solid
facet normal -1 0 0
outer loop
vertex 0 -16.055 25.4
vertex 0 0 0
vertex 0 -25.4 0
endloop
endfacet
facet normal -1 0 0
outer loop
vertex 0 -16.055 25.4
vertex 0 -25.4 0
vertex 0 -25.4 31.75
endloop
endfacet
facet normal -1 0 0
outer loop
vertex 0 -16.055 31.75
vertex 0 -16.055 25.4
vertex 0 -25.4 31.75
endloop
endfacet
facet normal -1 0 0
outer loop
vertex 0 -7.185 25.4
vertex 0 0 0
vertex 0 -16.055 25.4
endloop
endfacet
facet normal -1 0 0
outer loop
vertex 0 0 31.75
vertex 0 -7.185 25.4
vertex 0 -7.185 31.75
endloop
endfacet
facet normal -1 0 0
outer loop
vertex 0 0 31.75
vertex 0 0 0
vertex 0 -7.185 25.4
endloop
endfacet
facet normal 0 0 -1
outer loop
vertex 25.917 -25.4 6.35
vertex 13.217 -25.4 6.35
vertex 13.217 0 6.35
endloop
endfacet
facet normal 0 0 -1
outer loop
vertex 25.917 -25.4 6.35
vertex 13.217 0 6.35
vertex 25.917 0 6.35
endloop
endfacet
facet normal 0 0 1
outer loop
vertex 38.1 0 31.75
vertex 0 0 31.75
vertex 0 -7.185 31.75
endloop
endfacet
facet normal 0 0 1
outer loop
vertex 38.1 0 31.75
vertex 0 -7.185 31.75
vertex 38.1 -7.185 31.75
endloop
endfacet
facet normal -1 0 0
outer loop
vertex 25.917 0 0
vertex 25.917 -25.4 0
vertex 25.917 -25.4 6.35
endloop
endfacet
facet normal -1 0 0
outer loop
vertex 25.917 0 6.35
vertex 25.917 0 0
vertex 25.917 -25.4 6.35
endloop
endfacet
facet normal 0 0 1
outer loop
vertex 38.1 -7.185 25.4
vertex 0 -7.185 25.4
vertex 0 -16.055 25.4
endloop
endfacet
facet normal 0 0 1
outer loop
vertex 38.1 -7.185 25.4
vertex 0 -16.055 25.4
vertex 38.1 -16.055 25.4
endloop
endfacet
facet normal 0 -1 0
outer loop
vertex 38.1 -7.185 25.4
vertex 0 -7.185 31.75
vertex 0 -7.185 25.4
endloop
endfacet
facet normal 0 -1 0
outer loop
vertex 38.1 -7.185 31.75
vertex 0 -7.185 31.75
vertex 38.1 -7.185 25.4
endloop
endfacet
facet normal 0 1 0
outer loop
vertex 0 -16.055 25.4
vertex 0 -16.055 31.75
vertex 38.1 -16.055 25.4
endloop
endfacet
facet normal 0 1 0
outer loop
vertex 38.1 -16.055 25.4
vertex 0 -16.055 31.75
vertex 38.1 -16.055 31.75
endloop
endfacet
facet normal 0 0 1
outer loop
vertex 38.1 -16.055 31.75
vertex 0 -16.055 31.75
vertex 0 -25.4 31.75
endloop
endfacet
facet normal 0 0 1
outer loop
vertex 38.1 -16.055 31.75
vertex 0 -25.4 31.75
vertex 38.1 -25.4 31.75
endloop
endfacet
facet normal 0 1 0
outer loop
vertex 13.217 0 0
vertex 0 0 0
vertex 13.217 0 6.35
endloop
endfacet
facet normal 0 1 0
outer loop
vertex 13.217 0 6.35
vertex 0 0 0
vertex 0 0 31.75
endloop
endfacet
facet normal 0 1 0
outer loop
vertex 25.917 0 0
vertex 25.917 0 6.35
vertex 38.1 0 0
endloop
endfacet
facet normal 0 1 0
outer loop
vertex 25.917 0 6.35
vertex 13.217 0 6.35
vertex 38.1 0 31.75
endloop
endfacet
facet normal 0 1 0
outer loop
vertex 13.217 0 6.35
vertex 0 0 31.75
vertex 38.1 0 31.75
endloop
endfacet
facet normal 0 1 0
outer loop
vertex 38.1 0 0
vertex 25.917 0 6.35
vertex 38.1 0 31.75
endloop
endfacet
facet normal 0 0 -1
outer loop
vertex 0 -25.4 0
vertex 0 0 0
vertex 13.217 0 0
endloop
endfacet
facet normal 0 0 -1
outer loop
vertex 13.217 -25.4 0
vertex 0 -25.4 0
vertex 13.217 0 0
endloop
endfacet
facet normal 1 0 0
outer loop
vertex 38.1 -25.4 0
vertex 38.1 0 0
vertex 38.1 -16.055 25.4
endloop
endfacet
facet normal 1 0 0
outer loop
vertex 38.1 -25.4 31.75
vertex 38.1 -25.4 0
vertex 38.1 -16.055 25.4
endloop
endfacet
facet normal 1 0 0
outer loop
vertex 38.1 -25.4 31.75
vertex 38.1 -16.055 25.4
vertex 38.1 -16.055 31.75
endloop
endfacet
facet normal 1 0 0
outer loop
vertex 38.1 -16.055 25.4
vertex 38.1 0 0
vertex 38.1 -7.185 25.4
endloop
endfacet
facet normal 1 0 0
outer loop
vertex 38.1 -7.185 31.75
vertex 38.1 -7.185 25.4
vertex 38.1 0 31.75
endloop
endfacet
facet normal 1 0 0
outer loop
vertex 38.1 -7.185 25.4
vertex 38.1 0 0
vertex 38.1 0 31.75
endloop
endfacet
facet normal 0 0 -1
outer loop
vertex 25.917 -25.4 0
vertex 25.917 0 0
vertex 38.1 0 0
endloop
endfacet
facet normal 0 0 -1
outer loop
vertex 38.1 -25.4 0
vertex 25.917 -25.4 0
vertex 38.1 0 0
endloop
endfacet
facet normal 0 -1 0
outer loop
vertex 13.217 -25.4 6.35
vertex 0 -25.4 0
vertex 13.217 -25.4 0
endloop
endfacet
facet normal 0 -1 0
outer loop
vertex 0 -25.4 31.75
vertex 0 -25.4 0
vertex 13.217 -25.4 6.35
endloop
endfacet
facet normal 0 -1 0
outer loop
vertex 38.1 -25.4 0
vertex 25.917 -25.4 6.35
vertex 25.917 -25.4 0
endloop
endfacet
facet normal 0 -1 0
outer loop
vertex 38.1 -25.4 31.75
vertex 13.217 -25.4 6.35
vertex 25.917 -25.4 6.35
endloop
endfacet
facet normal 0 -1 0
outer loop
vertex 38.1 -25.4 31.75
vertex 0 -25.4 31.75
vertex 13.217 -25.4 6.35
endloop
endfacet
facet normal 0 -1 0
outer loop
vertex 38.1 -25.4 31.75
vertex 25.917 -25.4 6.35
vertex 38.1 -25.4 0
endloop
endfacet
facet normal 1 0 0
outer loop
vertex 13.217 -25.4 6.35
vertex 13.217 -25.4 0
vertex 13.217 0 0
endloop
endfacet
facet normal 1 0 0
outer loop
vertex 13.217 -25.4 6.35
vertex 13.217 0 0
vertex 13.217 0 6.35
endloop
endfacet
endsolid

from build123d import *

# Parameters (mm, degrees)
F0_W     = 38.1
F0_H     = 31.75
F1_DEPTH = 25.4
F2_W     = 12.7
F2_H     = 6.35
F3_DEPTH = 25.401
F4_W     = 38.1
F4_H     = 8.8702891953
F5_DEPTH = 6.35


# Not quite as in the source:
# - a length typed as a fraction of an inch, garbled in the dataset ("3 / 203.2 mm" for 3/8 in), is restored


with BuildPart() as f1:
    # F0 (on Front) → F1 (new body)
    with BuildSketch(Plane.XZ):
        with Locations((19.05, 15.875)):
            Rectangle(F0_W, F0_H)
    extrude(amount=F1_DEPTH)

    # F2 (on face) → F3 (cut, through all)
    with BuildSketch(Plane.XZ.offset(25.4)):
        with Locations((19.5667292759, 3.175)):
            Rectangle(F2_W, F2_H)
    extrude(amount=-F3_DEPTH, mode=Mode.SUBTRACT)

    # F4 (on face) → F5 (cut)
    with BuildSketch(Plane.XY.offset(31.75)):
        with Locations((19.05, -11.620078003)):
            Rectangle(F4_W, F4_H)
    extrude(amount=-F5_DEPTH, mode=Mode.SUBTRACT)


solid = f1.part
